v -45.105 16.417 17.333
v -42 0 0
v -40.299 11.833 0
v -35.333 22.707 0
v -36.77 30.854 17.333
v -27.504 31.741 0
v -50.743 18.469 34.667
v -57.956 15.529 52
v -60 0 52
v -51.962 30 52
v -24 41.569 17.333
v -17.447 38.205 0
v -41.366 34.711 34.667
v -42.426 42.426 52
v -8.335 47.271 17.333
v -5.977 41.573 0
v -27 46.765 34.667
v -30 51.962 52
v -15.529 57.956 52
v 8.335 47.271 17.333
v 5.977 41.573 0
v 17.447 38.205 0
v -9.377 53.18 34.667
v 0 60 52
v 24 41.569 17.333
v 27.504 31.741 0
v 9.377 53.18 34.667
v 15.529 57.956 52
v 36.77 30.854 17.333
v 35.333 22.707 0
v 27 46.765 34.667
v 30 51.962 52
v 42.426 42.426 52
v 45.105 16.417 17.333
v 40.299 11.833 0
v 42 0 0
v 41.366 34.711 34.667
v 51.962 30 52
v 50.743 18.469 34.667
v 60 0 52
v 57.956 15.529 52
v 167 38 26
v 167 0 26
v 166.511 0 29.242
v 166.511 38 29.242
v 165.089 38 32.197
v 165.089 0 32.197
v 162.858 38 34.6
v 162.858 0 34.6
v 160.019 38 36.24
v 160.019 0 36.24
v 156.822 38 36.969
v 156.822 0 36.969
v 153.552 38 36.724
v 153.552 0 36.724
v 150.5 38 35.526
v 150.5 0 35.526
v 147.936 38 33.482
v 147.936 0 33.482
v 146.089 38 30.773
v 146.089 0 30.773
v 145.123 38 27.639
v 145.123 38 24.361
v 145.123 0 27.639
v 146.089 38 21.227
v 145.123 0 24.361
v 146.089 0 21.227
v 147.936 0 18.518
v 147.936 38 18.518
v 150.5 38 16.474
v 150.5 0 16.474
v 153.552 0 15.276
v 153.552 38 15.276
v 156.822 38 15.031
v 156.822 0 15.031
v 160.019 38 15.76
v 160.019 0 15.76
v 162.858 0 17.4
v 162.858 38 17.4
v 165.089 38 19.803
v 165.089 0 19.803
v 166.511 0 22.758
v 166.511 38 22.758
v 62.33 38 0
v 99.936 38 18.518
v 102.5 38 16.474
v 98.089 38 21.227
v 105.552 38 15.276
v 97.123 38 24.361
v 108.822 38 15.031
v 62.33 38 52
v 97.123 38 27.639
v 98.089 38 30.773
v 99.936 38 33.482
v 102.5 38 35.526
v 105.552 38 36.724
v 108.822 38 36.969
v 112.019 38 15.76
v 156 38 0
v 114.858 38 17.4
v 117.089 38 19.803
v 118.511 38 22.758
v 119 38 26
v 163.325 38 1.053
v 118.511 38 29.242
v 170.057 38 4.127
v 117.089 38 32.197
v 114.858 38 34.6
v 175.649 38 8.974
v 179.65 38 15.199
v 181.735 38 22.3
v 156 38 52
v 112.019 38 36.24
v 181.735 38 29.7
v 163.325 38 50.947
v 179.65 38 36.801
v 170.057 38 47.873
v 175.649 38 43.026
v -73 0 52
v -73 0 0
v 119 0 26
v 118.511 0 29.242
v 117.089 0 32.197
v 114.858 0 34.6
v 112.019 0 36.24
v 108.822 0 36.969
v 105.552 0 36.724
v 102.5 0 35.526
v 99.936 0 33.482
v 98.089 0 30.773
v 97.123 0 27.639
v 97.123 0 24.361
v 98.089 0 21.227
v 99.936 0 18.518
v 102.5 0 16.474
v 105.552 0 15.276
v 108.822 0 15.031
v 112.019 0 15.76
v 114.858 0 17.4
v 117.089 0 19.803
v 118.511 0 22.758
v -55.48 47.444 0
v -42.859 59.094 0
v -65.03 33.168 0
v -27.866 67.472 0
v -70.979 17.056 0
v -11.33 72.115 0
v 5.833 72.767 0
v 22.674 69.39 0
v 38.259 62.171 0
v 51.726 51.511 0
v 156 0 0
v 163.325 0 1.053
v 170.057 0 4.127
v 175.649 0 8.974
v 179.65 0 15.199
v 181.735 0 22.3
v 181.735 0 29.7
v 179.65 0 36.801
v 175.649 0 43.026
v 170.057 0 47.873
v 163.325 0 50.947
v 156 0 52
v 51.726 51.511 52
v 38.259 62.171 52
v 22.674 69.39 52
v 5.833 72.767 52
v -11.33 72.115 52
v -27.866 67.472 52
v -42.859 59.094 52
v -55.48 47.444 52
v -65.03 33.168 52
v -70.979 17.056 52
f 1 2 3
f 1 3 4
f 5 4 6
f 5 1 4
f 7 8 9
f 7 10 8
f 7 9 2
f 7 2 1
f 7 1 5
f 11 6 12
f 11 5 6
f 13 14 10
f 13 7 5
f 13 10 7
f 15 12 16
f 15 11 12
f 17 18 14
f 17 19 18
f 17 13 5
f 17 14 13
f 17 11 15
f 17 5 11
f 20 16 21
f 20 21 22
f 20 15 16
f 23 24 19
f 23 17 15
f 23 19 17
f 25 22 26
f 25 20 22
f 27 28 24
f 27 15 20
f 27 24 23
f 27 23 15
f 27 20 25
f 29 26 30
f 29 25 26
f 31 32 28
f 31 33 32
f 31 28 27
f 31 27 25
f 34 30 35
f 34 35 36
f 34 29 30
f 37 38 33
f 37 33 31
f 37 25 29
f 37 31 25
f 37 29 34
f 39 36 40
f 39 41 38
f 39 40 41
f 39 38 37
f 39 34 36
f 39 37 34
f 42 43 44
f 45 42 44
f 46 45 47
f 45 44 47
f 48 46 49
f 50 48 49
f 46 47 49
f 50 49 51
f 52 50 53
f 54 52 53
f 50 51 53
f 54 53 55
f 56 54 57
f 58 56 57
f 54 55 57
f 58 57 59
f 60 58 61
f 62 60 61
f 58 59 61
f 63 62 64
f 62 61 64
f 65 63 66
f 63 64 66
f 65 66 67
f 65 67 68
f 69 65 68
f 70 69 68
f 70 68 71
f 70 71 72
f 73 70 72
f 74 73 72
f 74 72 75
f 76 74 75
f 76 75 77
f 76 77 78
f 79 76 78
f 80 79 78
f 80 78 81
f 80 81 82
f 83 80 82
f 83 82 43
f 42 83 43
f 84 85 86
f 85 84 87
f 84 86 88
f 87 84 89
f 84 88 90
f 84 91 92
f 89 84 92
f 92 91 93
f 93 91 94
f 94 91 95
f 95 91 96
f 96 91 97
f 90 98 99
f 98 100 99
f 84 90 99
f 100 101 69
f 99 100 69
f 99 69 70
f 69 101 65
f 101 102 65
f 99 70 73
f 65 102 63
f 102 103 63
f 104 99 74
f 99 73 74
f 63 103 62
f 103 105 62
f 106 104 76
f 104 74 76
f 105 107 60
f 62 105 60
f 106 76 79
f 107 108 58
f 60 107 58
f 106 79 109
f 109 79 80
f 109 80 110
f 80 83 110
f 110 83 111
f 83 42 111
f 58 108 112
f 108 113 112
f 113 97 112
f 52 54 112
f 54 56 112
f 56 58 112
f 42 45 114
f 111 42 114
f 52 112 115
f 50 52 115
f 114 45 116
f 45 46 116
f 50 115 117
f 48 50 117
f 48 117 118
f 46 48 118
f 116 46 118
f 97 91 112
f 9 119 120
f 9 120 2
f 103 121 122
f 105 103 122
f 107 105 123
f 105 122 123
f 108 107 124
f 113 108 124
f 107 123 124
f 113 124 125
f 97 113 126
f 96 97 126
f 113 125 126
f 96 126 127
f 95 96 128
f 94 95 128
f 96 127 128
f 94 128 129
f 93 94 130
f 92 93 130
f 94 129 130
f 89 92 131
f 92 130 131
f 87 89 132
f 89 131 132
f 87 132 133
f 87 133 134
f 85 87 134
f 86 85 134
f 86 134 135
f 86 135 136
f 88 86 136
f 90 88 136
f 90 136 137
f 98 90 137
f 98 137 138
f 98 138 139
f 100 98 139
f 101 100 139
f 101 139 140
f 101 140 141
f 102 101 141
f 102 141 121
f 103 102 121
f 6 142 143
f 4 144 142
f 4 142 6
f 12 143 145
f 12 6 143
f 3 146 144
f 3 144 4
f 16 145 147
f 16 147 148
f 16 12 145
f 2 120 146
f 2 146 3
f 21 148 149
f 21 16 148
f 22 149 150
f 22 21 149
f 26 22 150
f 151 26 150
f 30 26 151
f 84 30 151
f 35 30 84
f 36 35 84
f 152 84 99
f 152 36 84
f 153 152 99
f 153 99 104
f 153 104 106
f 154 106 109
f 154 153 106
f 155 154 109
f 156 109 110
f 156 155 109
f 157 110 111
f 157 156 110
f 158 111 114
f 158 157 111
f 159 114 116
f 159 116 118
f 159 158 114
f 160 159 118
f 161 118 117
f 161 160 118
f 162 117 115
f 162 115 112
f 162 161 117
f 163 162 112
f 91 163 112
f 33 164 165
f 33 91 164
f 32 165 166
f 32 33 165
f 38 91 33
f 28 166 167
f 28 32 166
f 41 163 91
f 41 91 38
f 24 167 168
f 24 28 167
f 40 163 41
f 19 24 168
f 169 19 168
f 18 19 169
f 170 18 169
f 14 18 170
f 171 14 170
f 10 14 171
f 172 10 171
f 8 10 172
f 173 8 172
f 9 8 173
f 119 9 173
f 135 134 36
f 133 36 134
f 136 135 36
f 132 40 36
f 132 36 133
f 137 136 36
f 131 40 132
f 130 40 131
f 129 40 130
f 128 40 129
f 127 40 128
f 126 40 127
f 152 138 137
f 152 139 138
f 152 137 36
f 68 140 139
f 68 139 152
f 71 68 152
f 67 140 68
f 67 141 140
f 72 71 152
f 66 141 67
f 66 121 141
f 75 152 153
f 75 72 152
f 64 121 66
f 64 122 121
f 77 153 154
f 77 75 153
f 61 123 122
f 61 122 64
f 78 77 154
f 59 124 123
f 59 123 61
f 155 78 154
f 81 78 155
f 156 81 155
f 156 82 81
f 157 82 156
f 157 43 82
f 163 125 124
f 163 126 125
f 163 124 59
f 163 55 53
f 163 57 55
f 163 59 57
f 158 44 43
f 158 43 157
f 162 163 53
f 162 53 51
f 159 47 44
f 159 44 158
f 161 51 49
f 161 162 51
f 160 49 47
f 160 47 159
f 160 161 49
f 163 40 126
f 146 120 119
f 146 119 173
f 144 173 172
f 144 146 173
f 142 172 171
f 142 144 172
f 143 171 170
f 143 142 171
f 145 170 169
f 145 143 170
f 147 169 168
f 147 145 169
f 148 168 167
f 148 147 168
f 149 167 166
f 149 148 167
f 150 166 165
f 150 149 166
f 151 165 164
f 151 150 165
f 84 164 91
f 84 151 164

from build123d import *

# Parameters (mm, degrees)
F1_ANGLE = 180
F3_DEPTH = 38
F4_R     = 11
F5_DEPTH = 117


with BuildPart() as f1:
    # F0 (on Front) → F1 (revolve)
    with BuildSketch(Plane.XZ):
        Polygon((-60, 52), (-73, 52), (-73, 0), (-42, 0), align=None)
    revolve(axis=Axis((0, 0, 37.335005), (0, 0, -1)), revolution_arc=F1_ANGLE)

    # F2 (on Front) → F3 (join)
    with BuildSketch(Plane.XZ):
        with BuildLine():
            ThreePointArc((156, 0), (182, 26), (156, 52))
            Line((156, 52), (60, 52))
            Line((60, 52), (42, 0))
            Line((42, 0), (156, 0))
        make_face()
    extrude(amount=-F3_DEPTH)

    # F4 (on face) → F5 (cut)
    with BuildSketch(Plane.XZ):
        with Locations((156, 26)):
            Circle(F4_R)
        with Locations((108, 26)):
            Circle(F4_R)
    extrude(amount=-F5_DEPTH, mode=Mode.SUBTRACT)


solid = f1.part
